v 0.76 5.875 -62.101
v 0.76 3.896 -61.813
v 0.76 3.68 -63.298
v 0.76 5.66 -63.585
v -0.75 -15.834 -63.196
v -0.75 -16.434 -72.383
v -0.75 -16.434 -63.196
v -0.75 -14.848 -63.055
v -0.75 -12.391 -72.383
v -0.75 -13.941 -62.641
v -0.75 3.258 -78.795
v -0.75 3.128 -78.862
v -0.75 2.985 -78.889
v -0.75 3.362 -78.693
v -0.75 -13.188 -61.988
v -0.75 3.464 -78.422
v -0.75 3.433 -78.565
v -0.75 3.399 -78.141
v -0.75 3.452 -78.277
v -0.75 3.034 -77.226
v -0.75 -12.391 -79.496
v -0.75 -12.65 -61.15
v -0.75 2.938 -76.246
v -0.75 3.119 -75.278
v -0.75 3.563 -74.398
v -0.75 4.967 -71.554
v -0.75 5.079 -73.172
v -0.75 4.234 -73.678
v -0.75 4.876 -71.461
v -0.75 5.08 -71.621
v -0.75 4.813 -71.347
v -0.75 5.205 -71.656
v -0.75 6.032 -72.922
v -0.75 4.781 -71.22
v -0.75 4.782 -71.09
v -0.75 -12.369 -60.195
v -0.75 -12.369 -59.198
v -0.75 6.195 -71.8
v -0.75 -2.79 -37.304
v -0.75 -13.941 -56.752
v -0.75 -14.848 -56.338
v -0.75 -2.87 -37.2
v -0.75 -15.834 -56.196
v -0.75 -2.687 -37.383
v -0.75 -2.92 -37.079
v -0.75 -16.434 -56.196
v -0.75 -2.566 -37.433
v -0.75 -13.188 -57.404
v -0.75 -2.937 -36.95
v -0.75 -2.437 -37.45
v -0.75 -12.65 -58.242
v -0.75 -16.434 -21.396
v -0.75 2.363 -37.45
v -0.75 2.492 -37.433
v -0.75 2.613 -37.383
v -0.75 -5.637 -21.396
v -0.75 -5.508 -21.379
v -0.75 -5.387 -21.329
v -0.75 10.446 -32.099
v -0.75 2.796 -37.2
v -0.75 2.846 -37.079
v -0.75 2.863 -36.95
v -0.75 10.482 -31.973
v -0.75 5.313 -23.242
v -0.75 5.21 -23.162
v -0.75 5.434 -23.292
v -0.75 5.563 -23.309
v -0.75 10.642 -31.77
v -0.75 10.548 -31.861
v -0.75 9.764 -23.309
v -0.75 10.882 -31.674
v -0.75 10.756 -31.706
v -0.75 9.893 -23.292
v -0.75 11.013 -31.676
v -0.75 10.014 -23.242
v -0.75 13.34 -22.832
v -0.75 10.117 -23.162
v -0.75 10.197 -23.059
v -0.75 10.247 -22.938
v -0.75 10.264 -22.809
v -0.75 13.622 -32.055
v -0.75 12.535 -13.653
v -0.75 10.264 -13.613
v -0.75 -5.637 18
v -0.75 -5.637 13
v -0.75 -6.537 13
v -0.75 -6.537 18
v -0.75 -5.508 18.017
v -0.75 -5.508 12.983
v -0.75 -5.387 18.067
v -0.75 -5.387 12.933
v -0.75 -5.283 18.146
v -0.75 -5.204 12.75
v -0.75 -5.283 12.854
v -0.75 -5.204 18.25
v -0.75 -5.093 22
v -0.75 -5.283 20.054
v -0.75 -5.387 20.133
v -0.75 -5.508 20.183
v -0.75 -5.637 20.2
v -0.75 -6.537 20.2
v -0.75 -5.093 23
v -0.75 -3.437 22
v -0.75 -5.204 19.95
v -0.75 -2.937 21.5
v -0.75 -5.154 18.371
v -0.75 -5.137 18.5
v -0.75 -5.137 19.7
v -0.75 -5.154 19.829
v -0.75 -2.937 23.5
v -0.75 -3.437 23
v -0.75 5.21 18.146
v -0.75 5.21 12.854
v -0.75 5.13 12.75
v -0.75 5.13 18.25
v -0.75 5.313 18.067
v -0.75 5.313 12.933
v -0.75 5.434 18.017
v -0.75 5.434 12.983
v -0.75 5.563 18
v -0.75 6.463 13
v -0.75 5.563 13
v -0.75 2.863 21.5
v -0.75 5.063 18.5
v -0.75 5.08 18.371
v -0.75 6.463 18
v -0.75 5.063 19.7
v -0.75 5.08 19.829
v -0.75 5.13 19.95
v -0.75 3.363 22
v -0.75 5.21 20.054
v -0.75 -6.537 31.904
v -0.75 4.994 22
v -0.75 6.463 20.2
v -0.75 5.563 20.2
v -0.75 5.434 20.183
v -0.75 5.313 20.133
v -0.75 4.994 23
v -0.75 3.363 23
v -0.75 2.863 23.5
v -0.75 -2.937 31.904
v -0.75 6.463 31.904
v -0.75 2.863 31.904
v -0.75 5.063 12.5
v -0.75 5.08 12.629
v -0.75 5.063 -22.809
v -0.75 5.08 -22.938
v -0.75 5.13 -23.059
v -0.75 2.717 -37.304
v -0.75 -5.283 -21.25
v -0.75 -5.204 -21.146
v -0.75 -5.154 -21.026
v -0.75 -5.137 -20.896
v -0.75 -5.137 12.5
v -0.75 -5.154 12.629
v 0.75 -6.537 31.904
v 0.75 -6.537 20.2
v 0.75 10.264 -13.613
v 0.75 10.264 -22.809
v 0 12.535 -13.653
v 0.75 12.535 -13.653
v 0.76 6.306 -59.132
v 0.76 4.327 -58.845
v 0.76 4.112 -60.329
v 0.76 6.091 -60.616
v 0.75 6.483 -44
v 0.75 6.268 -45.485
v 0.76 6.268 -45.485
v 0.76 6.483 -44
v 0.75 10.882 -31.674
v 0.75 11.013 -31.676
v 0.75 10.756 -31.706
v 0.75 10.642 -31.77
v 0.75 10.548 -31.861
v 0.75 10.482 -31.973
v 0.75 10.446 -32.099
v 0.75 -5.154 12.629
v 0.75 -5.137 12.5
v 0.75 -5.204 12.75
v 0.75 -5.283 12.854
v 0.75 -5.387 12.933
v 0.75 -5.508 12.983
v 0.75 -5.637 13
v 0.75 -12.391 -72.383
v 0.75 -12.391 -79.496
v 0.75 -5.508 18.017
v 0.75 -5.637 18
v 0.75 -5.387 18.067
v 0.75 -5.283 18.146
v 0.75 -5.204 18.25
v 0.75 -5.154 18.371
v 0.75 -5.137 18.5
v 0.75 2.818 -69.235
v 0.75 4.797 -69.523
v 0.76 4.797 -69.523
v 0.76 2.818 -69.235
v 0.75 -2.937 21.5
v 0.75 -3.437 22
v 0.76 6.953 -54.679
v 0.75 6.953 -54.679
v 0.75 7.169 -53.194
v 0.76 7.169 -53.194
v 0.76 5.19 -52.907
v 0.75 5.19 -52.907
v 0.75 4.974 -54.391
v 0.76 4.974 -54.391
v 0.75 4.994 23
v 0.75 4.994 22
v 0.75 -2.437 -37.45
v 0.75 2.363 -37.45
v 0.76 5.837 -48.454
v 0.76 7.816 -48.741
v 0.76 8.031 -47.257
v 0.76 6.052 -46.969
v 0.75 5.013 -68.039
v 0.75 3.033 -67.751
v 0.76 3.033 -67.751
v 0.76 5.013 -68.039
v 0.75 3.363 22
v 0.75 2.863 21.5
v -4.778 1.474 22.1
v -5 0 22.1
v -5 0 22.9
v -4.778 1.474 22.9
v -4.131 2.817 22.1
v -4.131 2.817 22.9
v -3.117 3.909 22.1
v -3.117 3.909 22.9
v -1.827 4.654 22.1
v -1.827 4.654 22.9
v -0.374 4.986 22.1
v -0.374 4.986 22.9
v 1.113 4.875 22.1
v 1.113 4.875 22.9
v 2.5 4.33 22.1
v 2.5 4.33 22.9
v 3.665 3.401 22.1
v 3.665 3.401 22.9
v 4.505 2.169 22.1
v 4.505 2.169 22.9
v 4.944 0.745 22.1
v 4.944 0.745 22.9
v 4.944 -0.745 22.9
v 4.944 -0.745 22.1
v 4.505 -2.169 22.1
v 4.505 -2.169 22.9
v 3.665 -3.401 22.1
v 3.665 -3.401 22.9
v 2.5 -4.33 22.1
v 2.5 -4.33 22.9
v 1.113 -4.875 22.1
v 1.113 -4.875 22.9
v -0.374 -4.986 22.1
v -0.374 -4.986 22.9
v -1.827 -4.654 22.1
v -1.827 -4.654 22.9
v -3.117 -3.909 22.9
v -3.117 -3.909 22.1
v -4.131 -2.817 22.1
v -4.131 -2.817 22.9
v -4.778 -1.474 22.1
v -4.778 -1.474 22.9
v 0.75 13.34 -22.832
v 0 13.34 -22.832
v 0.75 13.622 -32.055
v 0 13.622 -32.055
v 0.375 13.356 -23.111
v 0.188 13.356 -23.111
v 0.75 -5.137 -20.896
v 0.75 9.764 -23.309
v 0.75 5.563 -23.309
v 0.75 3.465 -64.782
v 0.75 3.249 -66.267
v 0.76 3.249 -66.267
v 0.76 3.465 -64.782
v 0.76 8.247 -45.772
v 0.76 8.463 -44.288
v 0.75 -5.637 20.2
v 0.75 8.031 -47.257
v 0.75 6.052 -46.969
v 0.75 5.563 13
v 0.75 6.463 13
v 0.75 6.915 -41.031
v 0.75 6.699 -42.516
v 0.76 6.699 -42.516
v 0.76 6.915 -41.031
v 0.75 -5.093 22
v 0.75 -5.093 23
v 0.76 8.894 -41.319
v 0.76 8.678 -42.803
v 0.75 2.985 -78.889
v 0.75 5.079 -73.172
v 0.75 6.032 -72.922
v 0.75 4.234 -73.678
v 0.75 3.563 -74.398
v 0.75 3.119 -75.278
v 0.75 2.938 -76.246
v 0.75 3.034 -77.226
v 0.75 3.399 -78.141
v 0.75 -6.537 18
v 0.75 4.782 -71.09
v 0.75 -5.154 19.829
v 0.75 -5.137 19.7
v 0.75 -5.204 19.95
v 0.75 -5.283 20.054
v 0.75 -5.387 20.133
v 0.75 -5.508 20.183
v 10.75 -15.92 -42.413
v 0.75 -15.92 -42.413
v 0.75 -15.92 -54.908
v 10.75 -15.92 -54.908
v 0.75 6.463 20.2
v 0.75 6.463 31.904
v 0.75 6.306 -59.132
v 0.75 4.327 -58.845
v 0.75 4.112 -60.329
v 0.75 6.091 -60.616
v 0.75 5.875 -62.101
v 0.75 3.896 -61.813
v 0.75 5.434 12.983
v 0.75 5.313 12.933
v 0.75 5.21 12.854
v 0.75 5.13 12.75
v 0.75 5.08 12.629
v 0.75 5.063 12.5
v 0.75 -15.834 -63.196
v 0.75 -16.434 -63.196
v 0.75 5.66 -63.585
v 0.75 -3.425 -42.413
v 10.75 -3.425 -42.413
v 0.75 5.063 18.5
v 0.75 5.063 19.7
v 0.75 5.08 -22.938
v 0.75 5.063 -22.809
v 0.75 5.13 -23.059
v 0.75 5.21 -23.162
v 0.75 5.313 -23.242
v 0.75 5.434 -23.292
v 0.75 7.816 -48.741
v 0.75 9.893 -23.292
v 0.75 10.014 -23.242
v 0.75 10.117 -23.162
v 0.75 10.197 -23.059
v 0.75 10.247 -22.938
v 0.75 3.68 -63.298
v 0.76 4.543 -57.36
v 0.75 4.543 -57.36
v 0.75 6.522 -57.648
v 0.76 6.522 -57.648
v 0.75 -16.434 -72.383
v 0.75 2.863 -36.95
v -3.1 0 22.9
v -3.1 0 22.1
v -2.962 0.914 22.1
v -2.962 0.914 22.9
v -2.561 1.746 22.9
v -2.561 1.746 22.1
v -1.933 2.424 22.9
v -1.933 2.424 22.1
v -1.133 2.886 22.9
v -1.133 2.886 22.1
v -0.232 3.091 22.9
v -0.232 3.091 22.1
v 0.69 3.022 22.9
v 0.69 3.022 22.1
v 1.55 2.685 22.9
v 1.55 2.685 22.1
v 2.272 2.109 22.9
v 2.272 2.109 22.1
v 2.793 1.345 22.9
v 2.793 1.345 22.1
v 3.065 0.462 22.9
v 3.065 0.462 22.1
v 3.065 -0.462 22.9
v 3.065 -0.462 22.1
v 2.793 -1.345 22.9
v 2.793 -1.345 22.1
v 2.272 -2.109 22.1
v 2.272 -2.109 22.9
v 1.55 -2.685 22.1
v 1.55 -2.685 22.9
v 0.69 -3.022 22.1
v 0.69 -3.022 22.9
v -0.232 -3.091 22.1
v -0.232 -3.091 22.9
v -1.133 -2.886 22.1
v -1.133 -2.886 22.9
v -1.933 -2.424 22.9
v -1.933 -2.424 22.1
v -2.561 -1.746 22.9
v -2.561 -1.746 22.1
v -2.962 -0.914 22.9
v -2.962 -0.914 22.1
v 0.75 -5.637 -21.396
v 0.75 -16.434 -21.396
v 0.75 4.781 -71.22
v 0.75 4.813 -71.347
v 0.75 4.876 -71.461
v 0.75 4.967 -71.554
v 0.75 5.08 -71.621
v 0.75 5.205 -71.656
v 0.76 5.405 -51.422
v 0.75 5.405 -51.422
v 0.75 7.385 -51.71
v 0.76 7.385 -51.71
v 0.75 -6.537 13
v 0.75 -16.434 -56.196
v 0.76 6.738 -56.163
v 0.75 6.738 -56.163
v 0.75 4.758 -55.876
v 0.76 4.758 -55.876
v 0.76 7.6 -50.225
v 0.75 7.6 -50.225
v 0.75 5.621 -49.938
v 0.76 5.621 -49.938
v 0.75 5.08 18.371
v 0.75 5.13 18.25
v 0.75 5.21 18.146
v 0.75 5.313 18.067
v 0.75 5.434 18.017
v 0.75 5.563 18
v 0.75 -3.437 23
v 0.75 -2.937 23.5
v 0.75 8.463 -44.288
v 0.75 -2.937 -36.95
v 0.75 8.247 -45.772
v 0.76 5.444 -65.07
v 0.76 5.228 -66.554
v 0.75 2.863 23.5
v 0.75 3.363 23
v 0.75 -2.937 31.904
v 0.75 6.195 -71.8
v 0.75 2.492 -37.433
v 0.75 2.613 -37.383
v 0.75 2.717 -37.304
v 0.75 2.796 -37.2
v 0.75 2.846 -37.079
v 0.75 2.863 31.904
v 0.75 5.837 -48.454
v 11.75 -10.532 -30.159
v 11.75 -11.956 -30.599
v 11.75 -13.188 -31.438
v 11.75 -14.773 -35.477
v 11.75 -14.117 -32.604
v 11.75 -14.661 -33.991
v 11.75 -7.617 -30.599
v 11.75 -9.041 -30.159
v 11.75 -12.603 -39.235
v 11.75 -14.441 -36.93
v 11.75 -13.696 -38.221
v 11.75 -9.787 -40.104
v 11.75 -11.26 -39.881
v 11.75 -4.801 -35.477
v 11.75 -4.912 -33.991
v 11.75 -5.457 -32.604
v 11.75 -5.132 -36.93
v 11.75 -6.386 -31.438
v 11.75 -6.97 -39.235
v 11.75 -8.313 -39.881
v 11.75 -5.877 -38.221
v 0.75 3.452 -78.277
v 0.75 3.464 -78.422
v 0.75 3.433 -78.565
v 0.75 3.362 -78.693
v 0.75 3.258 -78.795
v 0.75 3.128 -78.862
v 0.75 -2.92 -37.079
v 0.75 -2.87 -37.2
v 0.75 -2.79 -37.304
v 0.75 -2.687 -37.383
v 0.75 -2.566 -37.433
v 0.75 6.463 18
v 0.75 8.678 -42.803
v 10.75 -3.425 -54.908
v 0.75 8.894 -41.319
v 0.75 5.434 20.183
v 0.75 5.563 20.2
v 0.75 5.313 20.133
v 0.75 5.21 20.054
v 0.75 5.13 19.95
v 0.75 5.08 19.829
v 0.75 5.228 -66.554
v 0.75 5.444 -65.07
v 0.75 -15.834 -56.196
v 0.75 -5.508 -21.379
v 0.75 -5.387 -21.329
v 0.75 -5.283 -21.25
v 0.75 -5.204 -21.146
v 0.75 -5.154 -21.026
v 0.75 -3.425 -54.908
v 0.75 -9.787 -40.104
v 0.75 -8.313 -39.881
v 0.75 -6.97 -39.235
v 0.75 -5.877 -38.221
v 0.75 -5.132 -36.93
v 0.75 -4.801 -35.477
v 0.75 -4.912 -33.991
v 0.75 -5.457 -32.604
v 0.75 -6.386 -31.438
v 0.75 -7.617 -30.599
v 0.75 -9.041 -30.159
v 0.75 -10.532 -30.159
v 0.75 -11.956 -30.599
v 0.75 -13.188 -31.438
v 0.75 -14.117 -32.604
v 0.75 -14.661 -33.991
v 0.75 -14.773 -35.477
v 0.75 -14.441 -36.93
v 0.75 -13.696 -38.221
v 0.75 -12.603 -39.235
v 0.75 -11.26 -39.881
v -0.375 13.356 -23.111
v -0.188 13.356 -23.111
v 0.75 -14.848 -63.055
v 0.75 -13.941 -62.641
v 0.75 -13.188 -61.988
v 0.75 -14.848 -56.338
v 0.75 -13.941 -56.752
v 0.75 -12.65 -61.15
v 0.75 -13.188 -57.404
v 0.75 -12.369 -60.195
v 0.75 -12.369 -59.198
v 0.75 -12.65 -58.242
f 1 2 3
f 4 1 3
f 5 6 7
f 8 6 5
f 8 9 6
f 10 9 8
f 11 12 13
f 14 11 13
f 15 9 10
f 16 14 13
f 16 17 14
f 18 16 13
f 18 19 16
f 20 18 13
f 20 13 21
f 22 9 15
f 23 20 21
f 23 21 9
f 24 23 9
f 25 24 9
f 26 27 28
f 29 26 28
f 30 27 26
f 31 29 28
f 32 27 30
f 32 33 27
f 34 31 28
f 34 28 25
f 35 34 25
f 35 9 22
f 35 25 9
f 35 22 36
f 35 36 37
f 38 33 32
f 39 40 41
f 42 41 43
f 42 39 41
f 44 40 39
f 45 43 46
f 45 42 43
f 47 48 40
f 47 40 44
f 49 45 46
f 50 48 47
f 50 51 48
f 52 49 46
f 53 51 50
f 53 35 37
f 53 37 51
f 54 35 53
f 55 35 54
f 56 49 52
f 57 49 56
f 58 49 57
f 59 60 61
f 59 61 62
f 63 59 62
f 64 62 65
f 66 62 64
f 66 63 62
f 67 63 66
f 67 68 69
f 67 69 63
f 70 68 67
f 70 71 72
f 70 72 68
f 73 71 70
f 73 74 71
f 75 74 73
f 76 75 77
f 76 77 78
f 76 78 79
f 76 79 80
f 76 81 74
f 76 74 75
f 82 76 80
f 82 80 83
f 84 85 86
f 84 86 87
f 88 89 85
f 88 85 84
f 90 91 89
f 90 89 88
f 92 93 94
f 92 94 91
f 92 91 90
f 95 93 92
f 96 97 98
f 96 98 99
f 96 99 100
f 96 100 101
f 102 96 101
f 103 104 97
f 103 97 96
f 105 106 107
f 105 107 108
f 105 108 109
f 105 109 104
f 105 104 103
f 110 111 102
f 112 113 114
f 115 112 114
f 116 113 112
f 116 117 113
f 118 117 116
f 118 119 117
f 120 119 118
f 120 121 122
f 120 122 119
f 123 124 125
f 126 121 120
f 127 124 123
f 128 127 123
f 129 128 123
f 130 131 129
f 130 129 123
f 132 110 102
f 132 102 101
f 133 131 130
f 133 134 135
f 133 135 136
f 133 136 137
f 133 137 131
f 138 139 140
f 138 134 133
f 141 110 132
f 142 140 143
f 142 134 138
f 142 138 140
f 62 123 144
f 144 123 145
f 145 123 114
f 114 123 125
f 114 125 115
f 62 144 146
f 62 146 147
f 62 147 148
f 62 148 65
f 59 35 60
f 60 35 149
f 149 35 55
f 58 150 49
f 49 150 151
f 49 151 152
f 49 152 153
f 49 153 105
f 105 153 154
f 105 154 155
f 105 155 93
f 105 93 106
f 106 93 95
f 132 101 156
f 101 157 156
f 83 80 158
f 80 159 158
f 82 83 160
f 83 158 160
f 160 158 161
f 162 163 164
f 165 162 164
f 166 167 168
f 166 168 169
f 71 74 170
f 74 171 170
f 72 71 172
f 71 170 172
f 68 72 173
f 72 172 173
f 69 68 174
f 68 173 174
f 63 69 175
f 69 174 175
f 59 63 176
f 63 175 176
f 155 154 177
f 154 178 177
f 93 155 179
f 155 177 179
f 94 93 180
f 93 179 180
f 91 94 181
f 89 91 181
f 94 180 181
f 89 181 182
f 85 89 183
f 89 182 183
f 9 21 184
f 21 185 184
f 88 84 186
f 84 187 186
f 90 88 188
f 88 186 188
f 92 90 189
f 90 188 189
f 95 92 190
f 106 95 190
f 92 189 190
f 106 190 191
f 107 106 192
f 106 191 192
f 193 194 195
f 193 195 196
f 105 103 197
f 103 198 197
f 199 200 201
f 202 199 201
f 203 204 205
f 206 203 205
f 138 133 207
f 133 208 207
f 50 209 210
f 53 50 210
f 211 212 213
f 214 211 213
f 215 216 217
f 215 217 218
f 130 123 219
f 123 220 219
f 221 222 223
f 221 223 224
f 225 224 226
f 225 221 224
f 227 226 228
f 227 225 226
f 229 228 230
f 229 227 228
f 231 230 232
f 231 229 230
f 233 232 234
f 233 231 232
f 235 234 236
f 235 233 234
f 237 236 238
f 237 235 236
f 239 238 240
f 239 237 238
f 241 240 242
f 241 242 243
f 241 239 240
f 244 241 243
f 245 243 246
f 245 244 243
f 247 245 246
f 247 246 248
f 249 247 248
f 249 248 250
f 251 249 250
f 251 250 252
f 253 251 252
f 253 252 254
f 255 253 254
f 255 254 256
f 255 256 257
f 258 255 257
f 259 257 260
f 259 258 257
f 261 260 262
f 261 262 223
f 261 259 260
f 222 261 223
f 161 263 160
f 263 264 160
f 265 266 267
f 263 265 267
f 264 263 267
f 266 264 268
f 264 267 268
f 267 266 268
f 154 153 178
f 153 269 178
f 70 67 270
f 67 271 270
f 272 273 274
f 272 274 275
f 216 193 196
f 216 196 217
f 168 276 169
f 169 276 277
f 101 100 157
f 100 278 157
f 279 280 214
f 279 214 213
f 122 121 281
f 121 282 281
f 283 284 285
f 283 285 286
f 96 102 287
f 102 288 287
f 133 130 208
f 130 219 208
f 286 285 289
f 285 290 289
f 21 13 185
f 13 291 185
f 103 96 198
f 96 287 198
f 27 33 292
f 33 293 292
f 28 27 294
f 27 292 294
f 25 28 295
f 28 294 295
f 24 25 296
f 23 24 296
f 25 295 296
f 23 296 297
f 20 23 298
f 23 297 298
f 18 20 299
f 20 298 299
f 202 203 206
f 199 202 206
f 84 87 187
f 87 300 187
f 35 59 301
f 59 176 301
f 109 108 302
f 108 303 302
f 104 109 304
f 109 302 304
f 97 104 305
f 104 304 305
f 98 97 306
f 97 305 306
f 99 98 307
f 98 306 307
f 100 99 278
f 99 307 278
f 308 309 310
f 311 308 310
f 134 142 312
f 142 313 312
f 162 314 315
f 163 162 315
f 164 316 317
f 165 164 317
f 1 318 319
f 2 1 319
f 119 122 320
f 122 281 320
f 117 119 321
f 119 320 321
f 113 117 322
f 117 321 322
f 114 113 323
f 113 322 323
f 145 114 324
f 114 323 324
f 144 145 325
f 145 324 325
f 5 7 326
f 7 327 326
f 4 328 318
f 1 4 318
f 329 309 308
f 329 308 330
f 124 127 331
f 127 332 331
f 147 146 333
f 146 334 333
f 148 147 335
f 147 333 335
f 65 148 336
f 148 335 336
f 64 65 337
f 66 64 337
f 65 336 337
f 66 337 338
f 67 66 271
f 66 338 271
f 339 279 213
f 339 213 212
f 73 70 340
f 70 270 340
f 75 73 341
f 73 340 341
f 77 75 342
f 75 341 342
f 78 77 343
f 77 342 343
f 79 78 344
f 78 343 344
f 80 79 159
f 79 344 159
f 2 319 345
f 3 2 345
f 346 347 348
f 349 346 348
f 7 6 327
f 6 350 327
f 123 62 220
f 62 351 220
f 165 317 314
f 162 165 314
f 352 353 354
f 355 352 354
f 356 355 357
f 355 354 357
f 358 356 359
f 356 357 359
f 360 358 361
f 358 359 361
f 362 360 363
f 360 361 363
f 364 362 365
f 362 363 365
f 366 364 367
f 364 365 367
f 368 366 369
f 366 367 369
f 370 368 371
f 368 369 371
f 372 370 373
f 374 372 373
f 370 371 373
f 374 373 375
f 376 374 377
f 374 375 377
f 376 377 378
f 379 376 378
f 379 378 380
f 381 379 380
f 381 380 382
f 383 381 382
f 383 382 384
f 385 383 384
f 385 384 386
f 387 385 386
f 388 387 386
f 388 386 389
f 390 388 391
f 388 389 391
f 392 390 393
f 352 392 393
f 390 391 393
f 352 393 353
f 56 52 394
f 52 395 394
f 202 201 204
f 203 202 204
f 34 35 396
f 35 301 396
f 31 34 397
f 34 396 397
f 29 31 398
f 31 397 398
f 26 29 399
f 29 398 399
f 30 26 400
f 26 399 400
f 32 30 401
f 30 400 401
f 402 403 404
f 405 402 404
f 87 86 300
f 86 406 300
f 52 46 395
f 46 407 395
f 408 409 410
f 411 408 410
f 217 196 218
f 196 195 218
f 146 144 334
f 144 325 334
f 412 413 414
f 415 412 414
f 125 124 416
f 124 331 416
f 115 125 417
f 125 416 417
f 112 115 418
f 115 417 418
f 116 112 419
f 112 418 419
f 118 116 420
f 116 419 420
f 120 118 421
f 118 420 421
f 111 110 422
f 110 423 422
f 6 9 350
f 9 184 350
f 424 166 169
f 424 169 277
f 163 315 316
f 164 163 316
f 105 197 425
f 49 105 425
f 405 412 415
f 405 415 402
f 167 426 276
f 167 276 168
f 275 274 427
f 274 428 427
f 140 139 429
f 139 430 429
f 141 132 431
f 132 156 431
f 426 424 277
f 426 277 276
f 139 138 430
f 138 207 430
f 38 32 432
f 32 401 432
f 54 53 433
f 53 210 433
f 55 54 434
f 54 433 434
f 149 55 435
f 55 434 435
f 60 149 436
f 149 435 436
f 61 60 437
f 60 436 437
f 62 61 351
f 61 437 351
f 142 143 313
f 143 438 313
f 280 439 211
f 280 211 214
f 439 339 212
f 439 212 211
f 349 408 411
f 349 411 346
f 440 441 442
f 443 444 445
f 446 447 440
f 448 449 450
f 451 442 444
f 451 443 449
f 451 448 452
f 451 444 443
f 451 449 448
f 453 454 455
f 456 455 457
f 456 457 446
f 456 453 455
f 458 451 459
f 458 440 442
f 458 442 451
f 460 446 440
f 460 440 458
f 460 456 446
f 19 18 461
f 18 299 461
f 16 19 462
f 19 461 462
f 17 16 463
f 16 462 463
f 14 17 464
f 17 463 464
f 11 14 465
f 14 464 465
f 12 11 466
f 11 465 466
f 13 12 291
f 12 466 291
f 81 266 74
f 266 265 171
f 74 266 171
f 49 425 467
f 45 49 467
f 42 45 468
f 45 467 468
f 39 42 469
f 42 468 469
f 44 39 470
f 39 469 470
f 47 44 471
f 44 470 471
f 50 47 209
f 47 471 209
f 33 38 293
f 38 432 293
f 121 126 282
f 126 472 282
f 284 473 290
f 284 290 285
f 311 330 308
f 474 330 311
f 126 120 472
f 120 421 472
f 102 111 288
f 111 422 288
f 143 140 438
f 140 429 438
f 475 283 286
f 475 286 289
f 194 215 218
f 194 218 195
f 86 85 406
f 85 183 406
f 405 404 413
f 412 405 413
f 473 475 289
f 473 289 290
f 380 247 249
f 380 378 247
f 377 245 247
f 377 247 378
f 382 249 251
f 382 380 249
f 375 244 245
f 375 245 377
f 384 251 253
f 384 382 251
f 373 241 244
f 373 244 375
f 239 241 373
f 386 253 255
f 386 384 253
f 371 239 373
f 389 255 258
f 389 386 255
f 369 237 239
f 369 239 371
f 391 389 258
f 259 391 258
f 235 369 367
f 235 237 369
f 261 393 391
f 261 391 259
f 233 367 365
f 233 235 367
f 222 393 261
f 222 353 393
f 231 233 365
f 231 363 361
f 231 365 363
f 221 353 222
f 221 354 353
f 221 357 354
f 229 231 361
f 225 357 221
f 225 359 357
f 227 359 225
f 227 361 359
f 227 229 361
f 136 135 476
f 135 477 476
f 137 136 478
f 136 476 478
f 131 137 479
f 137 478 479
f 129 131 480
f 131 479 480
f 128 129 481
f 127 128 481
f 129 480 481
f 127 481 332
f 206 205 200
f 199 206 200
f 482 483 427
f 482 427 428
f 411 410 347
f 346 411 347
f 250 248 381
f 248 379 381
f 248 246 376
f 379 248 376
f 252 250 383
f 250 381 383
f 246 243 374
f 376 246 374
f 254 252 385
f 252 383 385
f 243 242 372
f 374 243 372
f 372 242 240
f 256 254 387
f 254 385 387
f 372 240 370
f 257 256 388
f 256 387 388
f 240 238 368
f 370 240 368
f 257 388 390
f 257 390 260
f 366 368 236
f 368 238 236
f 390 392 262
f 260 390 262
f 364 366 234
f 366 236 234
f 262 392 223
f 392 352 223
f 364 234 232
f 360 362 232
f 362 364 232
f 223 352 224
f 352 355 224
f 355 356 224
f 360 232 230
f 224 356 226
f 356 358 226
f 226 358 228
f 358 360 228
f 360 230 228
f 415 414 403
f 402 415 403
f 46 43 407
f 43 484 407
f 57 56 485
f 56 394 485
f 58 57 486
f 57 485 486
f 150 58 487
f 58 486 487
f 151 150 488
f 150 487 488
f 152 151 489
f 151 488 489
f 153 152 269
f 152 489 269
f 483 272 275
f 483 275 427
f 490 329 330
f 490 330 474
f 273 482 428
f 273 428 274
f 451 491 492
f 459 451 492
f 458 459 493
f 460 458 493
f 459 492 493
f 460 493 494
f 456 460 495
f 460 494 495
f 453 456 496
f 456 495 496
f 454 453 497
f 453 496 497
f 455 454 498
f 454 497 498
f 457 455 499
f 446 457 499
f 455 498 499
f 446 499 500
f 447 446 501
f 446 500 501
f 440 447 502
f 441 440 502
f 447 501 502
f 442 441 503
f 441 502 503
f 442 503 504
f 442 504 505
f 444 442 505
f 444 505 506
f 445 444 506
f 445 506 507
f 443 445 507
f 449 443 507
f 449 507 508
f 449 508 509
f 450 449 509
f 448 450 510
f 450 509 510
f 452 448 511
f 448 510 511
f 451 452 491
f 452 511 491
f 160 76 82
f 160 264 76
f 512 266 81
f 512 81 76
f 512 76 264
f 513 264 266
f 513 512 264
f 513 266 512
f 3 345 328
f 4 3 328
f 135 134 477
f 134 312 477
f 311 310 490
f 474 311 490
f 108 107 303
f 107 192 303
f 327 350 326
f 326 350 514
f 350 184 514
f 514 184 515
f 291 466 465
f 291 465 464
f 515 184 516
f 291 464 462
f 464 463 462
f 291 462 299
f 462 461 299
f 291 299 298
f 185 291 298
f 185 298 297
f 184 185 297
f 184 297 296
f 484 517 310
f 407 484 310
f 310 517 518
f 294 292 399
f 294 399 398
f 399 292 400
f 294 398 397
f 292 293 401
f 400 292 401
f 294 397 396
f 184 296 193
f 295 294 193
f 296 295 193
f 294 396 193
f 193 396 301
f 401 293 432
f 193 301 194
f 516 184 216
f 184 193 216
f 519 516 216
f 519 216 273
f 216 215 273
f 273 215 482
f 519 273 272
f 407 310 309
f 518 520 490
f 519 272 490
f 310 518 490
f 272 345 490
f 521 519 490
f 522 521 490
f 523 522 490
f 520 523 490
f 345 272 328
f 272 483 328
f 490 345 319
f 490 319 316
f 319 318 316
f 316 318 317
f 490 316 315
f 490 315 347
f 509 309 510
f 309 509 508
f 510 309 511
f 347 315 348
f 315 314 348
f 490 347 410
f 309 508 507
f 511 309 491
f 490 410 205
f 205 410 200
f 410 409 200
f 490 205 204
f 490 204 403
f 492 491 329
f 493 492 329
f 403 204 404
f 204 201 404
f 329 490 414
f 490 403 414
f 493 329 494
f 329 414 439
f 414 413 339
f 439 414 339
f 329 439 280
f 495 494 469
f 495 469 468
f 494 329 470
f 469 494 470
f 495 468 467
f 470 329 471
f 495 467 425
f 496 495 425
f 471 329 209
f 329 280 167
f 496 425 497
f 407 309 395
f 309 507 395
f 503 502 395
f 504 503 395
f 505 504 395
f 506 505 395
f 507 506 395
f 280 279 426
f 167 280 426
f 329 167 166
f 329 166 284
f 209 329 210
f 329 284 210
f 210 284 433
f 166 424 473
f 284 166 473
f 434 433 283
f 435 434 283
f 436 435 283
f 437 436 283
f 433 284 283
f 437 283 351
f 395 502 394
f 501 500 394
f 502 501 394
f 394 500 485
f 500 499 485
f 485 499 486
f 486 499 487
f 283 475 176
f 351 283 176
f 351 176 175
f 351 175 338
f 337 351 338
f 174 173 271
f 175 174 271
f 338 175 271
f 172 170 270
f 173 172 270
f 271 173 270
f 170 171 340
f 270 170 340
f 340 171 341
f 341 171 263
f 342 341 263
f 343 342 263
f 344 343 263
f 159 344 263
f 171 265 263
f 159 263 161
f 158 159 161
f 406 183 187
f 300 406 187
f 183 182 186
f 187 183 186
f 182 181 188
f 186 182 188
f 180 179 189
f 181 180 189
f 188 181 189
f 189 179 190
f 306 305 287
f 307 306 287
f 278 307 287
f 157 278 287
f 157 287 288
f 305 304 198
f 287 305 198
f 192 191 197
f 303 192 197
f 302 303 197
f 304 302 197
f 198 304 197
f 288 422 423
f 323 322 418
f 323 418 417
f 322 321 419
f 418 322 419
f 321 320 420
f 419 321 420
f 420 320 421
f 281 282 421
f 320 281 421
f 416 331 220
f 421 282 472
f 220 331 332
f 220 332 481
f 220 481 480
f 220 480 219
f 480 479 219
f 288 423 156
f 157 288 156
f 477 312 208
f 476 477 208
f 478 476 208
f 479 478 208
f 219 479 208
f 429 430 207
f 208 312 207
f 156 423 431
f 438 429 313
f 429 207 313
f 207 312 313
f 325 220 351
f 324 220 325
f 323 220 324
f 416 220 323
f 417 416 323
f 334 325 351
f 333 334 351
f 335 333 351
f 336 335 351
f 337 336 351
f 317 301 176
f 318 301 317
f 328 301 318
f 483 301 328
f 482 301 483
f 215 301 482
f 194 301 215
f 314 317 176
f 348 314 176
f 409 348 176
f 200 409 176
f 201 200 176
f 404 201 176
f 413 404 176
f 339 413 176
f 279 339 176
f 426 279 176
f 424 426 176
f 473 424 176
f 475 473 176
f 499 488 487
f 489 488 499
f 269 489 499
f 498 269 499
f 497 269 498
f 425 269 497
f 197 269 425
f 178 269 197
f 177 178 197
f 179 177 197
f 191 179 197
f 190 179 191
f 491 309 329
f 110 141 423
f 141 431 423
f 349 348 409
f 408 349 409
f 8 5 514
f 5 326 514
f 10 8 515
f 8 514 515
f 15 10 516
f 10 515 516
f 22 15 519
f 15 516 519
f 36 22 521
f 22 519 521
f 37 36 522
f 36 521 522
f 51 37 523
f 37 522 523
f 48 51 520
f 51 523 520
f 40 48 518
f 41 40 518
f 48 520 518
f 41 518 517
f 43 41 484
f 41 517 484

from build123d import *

# Parameters (mm, degrees)
BOSS_EXTRUDE1_DEPTH      = 0.75
BOSS_EXTRUDE1_DEPTH_BACK = 0.75
BOSS_EXTRUDE2_START      = -1.9
SKETCH3_R                = 5
SKETCH3_R_2              = 3.1
BOSS_EXTRUDE2_DEPTH      = 0.8
BOSS_EXTRUDE3_DEPTH      = 0.01
SKETCH7_W                = 12.494603103
SKETCH7_H                = 12.494603103
BOSS_EXTRUDE4_DEPTH      = 10
SKETCH8_R                = 5
BOSS_EXTRUDE5_DEPTH      = 11


with BuildPart() as part:
    # Sketch1 → Boss-Extrude1 (new, two sides: drawn at the far end of the back side and taken through both)
    with BuildSketch(Plane(origin=(0, 0, 0), x_dir=(0, 0, -1), z_dir=(1, 0, 0)).offset(-BOSS_EXTRUDE1_DEPTH_BACK)):
        with BuildLine():
            Line((37.45, -2.436931654), (37.45, 2.363068346))
            ThreePointArc((37.45, 2.363068346), (37.303553391, 2.716621736), (36.95, 2.863068346))
            Line((36.95, 2.863068346), (-21.5, 2.863068346))
            Line((-21.5, 2.863068346), (-22, 3.363068346))
            Line((-22, 3.363068346), (-22, 4.993594932))
            Line((-22, 4.993594932), (-23, 4.993594932))
            Line((-23, 4.993594932), (-23, 3.363068346))
            Line((-23, 3.363068346), (-23.5, 2.863068346))
            Line((-23.5, 2.863068346), (-31.90354955, 2.863068346))
            Line((-31.90354955, 2.863068346), (-31.90354955, 6.463068346))
            Line((-31.90354955, 6.463068346), (-20.2, 6.463068346))
            Line((-20.2, 6.463068346), (-20.2, 5.563068346))
            ThreePointArc((-20.2, 5.563068346), (-20.053553391, 5.209514955), (-19.7, 5.063068346))
            Line((-19.7, 5.063068346), (-18.5, 5.063068346))
            ThreePointArc((-18.5, 5.063068346), (-18.146446609, 5.209514955), (-18, 5.563068346))
            Line((-18, 5.563068346), (-18, 6.463068346))
            Line((-18, 6.463068346), (-13, 6.463068346))
            Line((-13, 6.463068346), (-13, 5.563068346))
            ThreePointArc((-13, 5.563068346), (-12.853553391, 5.209514955), (-12.5, 5.063068346))
            Line((-12.5, 5.063068346), (22.808726868, 5.063068346))
            ThreePointArc((22.808726868, 5.063068346), (23.162280258, 5.209514955), (23.308726868, 5.563068346))
            Line((23.308726868, 5.563068346), (23.308726868, 9.763832191))
            ThreePointArc((23.308726868, 9.763832191), (23.162280258, 10.117385581), (22.808726868, 10.263832191))
            Line((22.808726868, 10.263832191), (13.613096845, 10.263832191))
            Line((13.613096845, 10.263832191), (13.652735343, 12.534720206))
            add(Edge.make_bspline(
                [(32.054900348, 13.621703513), (30.632810596, 13.618897937), (27.64469846, 13.573512435), (23.109018983, 13.37869396), (18.397561725, 13.039599309), (15.246931074, 12.72008221), (13.652735343, 12.534720206)],
                knots=[0.843998206, 0.843998206, 0.843998206, 0.843998206, 0.921319408, 1.006376572, 1.091433737, 1.178910534, 1.178910534, 1.178910534, 1.178910534], degree=3))
            Line((32.054900348, 13.621703513), (31.675937422, 11.012861513))
            ThreePointArc((31.675937422, 11.012861513), (31.770038899, 10.641928201), (32.098868151, 10.446178534))
            Line((32.098868151, 10.446178534), (71.089648239, 4.782339895))
            ThreePointArc((71.089648239, 4.782339895), (71.46058155, 4.876441372), (71.656331218, 5.205270624))
            Line((71.656331218, 5.205270624), (71.800083467, 6.194884332))
            Line((71.800083467, 6.194884332), (72.922346789, 6.031863269))
            ThreePointArc((72.922346789, 6.031863269), (74.822358128, 3.309709233), (78.140832287, 3.398562734))
            ThreePointArc((78.140832287, 3.398562734), (78.6316623, 3.402395008), (78.889259875, 2.984576534))
            Line((78.889259875, 2.984576534), (79.495780173, -12.391250274))
            Line((79.495780173, -12.391250274), (72.383118526, -12.391250274))
            Line((72.383118526, -12.391250274), (72.383118526, -16.433593955))
            Line((72.383118526, -16.433593955), (63.19645045, -16.433593955))
            Line((63.19645045, -16.433593955), (63.19645045, -15.833593955))
            ThreePointArc((63.19645045, -15.833593955), (59.69645045, -12.333593955), (56.19645045, -15.833593955))
            Line((56.19645045, -15.833593955), (56.19645045, -16.433593955))
            Line((56.19645045, -16.433593955), (21.39645045, -16.433593955))
            Line((21.39645045, -16.433593955), (21.39645045, -5.636931654))
            ThreePointArc((21.39645045, -5.636931654), (21.25000384, -5.283378264), (20.89645045, -5.136931654))
            Line((20.89645045, -5.136931654), (-12.5, -5.136931654))
            ThreePointArc((-12.5, -5.136931654), (-12.853553391, -5.283378264), (-13, -5.636931654))
            Line((-13, -5.636931654), (-13, -6.536931654))
            Line((-13, -6.536931654), (-18, -6.536931654))
            Line((-18, -6.536931654), (-18, -5.636931654))
            ThreePointArc((-18, -5.636931654), (-18.146446609, -5.283378264), (-18.5, -5.136931654))
            Line((-18.5, -5.136931654), (-19.7, -5.136931654))
            ThreePointArc((-19.7, -5.136931654), (-20.05355339, -5.283378264), (-20.2, -5.636931654))
            Line((-20.2, -5.636931654), (-20.2, -6.536931654))
            Line((-20.2, -6.536931654), (-31.90354955, -6.536931654))
            Line((-31.90354955, -6.536931654), (-31.90354955, -2.936931654))
            Line((-31.90354955, -2.936931654), (-23.5, -2.936931654))
            Line((-23.5, -2.936931654), (-23, -3.436931654))
            Line((-23, -3.436931654), (-23, -5.093265035))
            Line((-23, -5.093265035), (-22, -5.093265035))
            Line((-22, -5.093265035), (-22, -3.436931654))
            Line((-22, -3.436931654), (-21.5, -2.936931654))
            Line((-21.5, -2.936931654), (36.95, -2.936931654))
            ThreePointArc((36.95, -2.936931654), (37.303553391, -2.790485045), (37.45, -2.436931654))
        make_face()
    extrude(amount=BOSS_EXTRUDE1_DEPTH + BOSS_EXTRUDE1_DEPTH_BACK)

    # Sketch6 → Boss-Extrude3 (add)
    with BuildSketch(Plane(origin=(0.75, 0, 0), x_dir=(0, 0, -1), z_dir=(1, 0, 0))):
        Polygon((48.74107838, 7.815821162), (48.45357388, 5.836593747), (46.969153318, 6.052222121), (47.256657818, 8.031449537), align=None)
        Polygon((42.515891633, 6.699107245), (41.031471072, 6.914735619), (41.318975571, 8.893963035), (42.803396133, 8.67833466), align=None)
        Polygon((45.484732757, 6.267850496), (44.000312195, 6.48347887), (44.287816694, 8.462706286), (45.772237256, 8.247077911), align=None)
        Polygon((66.266620621, 3.249053252), (64.782200059, 3.464681626), (65.069704559, 5.443909042), (66.55412512, 5.228280667), align=None)
        Polygon((69.235461744, 2.817796503), (67.751041183, 3.033424877), (68.038545682, 5.012652293), (69.522966244, 4.797023918), align=None)
        Polygon((50.225498941, 7.600192788), (49.937994442, 5.620965372), (51.422415004, 5.405336997), (51.709919503, 7.384564413), align=None)
        Polygon((53.194340065, 7.168936038), (52.906835565, 5.189708623), (54.391256127, 4.974080248), (54.678760627, 6.953307664), align=None)
        Polygon((56.163181188, 6.737679289), (55.875676689, 4.758451874), (57.360097251, 4.542823499), (57.64760175, 6.522050915), align=None)
        Polygon((59.132022312, 6.30642254), (58.844517812, 4.327195125), (60.328938374, 4.11156675), (60.616442873, 6.090794166), align=None)
        Polygon((62.100863435, 5.875165791), (61.813358936, 3.895938375), (63.297779497, 3.680310001), (63.585283997, 5.659537416), align=None)
    extrude(amount=BOSS_EXTRUDE3_DEPTH)

    # Sketch7 → Boss-Extrude4 (add)
    with BuildSketch(Plane(origin=(0.75, 0, 0), x_dir=(0, 0, -1), z_dir=(1, 0, 0))):
        with Locations((48.660372479, -9.672279041)):
            Rectangle(SKETCH7_W, SKETCH7_H)
    extrude(amount=BOSS_EXTRUDE4_DEPTH)

    # Sketch8 → Boss-Extrude5 (add)
    with BuildSketch(Plane(origin=(0.75, 0, 0), x_dir=(0, 0, -1), z_dir=(1, 0, 0))):
        with Locations((35.103510038, -9.786647509)):
            Circle(SKETCH8_R)
    extrude(amount=BOSS_EXTRUDE5_DEPTH)


with BuildPart() as body_2:
    # Sketch3 → Boss-Extrude2 (new body)
    with BuildSketch(Plane(origin=(0, 0, 20.2), x_dir=(-1, 0, 0), z_dir=(0, 0, -1)).offset(BOSS_EXTRUDE2_START)):
        Circle(SKETCH3_R)
        Circle(SKETCH3_R_2, mode=Mode.SUBTRACT)
    extrude(amount=-BOSS_EXTRUDE2_DEPTH)


solid = Compound([part.part, body_2.part])
